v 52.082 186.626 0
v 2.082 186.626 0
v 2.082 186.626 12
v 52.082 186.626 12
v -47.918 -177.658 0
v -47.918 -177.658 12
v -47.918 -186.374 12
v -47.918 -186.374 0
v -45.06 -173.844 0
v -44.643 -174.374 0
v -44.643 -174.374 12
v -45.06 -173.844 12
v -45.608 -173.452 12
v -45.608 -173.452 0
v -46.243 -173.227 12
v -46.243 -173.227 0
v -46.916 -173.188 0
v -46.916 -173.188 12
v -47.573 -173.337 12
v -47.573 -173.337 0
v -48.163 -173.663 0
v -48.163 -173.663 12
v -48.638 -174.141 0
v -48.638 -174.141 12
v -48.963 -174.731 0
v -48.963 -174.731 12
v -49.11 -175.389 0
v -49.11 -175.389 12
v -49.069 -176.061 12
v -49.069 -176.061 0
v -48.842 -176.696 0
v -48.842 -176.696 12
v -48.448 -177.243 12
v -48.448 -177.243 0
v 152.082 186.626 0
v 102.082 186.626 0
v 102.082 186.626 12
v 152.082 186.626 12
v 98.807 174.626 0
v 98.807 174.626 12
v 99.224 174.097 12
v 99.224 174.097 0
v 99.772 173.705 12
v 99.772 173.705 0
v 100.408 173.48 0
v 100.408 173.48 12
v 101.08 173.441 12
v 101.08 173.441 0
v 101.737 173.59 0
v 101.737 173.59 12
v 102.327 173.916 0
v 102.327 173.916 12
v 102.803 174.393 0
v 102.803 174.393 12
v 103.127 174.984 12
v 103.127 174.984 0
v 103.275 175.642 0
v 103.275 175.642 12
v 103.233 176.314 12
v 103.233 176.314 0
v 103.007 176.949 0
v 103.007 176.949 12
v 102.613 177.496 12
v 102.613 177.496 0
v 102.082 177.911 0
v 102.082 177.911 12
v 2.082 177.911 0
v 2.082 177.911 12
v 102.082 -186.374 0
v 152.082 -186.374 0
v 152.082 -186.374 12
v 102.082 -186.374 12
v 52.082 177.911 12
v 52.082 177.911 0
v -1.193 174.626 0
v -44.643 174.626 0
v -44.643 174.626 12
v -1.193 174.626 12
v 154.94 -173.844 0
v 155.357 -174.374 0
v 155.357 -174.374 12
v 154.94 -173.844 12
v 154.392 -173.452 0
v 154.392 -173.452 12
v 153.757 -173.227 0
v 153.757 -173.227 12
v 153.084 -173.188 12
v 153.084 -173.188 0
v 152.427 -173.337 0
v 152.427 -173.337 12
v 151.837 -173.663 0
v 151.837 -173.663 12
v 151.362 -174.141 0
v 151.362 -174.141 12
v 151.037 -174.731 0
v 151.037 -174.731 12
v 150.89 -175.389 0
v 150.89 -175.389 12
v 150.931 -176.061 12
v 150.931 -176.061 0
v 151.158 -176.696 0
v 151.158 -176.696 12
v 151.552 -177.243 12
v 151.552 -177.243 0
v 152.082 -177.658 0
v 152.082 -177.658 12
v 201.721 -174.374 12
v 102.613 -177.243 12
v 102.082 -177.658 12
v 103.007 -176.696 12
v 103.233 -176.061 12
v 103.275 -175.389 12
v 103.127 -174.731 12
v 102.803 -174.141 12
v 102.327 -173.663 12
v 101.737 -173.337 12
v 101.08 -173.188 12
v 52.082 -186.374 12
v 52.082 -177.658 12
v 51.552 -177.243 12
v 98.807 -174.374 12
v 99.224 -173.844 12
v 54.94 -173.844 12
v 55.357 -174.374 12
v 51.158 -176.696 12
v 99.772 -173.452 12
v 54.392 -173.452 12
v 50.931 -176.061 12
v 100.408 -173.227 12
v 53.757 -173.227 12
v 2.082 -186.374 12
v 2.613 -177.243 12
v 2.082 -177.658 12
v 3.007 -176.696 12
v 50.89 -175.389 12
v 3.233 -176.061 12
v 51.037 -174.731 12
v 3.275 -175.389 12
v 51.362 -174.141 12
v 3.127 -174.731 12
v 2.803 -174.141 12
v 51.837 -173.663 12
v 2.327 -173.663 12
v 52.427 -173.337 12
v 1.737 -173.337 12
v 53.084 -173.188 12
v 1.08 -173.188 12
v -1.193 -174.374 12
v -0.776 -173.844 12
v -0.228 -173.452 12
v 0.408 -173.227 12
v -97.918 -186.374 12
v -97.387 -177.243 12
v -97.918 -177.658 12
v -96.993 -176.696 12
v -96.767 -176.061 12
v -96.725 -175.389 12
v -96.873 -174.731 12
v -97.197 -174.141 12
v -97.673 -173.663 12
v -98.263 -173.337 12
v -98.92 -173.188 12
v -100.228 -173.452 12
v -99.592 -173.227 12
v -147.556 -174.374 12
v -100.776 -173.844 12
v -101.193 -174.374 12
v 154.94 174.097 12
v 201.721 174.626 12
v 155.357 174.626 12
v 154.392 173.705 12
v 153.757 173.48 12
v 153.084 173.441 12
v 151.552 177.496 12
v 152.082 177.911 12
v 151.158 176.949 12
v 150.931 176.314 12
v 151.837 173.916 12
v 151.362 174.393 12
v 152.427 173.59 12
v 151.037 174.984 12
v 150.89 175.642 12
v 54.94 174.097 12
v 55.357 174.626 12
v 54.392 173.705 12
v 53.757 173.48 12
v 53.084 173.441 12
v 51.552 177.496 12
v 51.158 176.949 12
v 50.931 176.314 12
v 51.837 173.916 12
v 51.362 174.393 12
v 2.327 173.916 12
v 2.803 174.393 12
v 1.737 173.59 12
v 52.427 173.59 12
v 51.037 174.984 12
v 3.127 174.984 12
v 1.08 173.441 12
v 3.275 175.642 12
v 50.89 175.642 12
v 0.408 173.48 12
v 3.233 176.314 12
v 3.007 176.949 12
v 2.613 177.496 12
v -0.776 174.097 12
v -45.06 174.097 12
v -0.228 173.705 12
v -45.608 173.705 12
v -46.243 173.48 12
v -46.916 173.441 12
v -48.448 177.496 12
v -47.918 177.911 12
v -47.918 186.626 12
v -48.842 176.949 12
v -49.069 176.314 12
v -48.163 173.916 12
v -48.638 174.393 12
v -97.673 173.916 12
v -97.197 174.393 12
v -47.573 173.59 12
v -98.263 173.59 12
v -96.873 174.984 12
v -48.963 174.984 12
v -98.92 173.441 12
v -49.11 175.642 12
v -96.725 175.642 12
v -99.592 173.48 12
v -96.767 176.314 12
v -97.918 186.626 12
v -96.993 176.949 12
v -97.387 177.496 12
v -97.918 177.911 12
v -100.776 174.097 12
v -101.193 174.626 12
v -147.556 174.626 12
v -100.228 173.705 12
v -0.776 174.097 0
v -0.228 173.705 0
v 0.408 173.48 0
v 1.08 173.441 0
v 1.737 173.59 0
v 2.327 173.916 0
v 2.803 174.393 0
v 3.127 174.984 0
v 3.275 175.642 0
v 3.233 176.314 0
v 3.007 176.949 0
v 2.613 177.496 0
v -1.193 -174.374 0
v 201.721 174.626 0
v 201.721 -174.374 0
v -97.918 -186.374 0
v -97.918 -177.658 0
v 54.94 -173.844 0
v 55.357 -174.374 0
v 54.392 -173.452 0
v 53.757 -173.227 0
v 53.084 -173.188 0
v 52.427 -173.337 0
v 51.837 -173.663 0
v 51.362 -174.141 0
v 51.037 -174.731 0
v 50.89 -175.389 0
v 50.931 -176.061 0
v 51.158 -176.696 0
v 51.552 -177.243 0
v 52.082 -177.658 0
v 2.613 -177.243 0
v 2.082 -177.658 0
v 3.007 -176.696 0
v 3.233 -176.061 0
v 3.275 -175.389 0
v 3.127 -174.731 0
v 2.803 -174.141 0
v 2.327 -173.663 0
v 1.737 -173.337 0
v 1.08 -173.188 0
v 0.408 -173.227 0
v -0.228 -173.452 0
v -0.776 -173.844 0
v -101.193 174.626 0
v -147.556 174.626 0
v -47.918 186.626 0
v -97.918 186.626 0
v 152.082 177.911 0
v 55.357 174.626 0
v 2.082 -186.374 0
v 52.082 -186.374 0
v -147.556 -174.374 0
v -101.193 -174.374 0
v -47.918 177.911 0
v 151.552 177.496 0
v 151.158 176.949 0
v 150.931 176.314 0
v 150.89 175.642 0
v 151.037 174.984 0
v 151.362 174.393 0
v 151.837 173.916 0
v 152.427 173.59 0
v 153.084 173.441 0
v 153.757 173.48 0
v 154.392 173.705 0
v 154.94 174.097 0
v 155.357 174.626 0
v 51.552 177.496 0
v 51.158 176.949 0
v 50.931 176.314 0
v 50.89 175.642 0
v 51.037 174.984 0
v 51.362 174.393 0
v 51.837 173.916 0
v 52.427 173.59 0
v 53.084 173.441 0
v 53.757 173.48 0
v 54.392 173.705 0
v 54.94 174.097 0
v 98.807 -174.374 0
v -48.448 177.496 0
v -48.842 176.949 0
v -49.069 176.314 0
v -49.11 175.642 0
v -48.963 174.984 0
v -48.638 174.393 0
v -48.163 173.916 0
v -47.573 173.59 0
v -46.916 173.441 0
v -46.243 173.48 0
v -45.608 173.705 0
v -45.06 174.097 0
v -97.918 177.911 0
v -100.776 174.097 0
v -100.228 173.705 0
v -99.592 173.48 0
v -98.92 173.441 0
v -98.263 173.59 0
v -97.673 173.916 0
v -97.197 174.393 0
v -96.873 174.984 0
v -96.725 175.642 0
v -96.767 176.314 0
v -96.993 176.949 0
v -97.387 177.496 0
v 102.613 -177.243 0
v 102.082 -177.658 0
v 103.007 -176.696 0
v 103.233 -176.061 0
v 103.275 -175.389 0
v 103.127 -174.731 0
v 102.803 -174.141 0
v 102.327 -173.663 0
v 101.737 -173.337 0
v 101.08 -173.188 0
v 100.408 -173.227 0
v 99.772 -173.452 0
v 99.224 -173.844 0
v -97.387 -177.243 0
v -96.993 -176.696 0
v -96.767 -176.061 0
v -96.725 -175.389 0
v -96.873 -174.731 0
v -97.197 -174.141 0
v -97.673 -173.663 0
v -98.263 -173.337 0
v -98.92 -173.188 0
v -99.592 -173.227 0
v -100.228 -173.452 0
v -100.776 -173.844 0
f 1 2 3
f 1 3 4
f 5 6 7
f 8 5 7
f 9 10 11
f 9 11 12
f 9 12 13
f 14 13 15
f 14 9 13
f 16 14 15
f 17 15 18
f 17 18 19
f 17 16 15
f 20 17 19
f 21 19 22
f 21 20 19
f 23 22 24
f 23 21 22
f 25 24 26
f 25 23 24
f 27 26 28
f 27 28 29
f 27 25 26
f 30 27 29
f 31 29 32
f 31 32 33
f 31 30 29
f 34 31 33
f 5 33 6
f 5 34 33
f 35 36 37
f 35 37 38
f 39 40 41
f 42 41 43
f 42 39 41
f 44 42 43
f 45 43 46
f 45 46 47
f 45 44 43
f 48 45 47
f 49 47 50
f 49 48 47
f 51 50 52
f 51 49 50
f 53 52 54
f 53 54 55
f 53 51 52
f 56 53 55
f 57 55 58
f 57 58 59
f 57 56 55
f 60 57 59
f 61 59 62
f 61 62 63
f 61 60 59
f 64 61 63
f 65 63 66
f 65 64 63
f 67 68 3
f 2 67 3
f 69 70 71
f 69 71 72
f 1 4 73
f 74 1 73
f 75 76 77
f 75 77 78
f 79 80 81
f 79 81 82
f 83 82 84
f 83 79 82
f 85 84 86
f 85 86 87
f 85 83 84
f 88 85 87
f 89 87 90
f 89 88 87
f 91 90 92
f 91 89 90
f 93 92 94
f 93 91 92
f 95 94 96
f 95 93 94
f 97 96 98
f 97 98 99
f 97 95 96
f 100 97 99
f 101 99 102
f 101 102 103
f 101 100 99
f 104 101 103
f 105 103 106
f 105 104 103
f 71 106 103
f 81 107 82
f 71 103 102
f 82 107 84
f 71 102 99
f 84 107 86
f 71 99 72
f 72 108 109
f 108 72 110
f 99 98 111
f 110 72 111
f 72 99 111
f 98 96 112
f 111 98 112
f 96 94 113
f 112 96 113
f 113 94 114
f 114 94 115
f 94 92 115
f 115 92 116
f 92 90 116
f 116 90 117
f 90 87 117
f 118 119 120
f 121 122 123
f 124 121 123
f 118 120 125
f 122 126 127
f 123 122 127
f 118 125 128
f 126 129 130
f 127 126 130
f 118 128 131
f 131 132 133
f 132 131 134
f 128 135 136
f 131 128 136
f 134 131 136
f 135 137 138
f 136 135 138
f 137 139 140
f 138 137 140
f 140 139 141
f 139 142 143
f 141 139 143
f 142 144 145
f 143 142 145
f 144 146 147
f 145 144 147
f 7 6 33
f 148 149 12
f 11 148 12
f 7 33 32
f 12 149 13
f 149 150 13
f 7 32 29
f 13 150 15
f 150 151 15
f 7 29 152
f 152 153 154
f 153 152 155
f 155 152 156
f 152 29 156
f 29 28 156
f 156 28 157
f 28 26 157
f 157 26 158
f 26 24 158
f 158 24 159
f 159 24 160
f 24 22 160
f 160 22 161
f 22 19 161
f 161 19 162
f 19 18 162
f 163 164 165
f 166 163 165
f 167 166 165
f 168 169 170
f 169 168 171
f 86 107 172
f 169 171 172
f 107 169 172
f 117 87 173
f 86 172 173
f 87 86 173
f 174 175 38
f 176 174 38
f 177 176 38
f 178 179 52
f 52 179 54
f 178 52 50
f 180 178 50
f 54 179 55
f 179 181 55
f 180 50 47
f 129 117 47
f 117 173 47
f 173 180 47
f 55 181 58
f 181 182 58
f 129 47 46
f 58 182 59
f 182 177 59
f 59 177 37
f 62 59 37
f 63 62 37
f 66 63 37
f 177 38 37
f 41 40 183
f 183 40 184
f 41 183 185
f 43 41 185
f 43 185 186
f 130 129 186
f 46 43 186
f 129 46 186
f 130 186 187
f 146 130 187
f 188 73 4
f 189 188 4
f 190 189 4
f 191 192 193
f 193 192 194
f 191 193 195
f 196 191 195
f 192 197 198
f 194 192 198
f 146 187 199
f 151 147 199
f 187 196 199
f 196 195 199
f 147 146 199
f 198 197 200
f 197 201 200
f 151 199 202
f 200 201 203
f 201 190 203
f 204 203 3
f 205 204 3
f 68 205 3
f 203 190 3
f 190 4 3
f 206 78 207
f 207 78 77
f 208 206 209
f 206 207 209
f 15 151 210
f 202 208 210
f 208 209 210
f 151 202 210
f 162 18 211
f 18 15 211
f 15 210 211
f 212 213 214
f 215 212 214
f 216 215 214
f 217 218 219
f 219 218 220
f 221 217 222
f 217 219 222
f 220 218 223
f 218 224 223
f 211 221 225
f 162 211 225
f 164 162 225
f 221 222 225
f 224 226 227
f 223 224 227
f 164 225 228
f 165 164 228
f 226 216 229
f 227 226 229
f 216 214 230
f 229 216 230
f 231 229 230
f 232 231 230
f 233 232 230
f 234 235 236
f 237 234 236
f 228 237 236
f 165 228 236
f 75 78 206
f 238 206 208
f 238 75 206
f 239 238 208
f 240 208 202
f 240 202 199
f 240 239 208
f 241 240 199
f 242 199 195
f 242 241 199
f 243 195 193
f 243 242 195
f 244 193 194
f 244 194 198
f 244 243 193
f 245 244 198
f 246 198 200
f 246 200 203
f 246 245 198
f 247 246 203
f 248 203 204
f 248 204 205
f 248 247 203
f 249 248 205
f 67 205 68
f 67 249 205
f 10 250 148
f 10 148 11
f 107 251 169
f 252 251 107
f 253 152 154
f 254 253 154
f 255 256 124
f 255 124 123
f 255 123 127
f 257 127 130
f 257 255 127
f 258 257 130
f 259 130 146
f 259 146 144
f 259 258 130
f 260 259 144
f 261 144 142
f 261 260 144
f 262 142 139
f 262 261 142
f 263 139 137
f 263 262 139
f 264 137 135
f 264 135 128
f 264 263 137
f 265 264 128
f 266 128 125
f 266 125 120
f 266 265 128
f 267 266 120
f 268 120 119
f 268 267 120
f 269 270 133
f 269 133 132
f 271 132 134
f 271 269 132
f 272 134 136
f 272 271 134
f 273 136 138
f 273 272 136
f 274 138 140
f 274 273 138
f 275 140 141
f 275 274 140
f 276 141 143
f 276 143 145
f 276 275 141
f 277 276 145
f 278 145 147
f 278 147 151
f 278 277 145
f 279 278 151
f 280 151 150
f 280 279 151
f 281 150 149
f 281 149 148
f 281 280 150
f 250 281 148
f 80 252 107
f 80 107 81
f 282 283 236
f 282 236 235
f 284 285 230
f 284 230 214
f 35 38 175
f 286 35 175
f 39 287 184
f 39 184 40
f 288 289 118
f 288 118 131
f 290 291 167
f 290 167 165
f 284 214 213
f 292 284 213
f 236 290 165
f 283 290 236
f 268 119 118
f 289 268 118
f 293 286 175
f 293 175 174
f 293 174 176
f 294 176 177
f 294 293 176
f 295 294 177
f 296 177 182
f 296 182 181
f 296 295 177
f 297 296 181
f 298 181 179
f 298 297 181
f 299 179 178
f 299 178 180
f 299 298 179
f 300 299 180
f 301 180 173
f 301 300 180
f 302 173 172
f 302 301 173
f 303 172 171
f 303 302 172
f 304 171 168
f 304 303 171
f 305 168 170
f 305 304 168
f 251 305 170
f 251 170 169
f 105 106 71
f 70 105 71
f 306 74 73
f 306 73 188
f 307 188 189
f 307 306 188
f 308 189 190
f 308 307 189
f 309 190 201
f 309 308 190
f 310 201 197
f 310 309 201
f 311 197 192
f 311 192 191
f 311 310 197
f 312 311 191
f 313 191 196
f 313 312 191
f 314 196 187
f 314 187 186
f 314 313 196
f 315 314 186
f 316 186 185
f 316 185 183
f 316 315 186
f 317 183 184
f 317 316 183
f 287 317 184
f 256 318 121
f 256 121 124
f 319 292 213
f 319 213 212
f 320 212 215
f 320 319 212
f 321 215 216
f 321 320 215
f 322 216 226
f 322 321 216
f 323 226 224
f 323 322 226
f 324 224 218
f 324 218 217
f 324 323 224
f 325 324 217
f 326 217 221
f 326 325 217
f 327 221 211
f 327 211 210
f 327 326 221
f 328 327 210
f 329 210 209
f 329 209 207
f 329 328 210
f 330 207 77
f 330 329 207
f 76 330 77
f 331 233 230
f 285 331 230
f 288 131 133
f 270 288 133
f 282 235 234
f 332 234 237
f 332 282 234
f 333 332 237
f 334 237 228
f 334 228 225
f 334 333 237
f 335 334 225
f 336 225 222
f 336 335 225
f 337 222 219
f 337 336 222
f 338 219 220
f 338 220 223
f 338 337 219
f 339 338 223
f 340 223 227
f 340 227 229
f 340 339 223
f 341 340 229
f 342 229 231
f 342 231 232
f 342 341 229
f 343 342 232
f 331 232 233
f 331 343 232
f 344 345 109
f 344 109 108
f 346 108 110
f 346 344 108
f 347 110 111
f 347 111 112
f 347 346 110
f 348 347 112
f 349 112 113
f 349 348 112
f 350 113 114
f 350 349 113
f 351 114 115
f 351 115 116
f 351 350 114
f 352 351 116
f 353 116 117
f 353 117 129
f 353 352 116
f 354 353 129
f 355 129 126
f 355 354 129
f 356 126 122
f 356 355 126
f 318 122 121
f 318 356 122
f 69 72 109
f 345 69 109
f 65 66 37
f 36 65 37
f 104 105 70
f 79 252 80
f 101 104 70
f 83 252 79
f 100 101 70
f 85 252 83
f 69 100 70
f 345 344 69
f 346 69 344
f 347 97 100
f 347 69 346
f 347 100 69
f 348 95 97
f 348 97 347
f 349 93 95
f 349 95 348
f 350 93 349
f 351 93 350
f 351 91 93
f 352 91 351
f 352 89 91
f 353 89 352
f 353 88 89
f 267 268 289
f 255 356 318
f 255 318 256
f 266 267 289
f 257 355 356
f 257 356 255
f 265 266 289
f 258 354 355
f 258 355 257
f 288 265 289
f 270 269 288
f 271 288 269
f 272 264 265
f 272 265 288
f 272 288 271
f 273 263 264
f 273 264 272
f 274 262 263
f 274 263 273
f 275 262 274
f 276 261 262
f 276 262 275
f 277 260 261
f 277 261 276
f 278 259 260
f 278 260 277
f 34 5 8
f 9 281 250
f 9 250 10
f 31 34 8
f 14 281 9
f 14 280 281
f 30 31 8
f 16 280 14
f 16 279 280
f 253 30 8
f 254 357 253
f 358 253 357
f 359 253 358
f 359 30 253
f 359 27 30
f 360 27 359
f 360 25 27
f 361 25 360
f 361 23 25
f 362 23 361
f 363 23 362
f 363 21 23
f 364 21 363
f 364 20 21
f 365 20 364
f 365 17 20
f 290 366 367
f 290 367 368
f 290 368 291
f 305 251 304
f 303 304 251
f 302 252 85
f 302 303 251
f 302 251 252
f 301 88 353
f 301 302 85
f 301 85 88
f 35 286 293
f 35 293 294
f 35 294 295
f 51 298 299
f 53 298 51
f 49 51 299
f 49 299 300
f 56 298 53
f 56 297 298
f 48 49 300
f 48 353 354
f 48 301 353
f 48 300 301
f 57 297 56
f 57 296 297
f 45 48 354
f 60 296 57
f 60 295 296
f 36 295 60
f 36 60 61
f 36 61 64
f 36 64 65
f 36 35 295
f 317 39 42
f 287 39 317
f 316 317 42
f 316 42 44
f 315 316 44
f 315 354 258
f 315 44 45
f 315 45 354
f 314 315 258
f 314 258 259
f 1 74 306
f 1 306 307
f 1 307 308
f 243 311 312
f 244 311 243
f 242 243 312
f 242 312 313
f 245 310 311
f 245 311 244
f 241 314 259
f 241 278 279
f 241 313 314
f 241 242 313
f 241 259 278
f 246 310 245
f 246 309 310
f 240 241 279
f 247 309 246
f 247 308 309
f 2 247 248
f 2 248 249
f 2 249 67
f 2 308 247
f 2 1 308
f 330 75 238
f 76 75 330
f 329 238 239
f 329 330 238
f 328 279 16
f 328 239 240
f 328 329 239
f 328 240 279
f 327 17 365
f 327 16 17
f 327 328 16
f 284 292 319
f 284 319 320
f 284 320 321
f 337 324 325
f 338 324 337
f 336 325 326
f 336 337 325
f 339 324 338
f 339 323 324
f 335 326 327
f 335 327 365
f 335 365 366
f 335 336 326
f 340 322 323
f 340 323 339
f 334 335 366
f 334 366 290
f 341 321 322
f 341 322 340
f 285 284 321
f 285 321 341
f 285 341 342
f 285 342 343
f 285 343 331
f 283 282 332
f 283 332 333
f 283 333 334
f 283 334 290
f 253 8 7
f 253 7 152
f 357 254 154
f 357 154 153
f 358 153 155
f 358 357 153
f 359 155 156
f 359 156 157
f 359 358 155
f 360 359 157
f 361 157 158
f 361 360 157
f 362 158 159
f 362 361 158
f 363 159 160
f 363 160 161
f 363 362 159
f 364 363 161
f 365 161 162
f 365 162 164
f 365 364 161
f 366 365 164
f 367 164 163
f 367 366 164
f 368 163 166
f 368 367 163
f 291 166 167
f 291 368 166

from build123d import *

# Parameters (mm, degrees)
BOSS_EXTRUDE1_DEPTH = 12


with BuildPart() as part:
    # Sketch1 → Boss-Extrude1 (new body)
    with BuildSketch(Plane.XY):
        with BuildLine():
            Line((-147.556413952, 174.626444756), (-101.192621764, 174.626444756))
            ThreePointArc((-101.192621764, 174.626444756), (-97.418155085, 174.138042833), (-97.917719368, 177.911048356))
            Line((-97.917719368, 177.911048356), (-97.917719368, 186.626444756))
            Line((-97.917719368, 186.626444756), (-47.917719368, 186.626444756))
            Line((-47.917719368, 186.626444756), (-47.917719368, 177.911048356))
            ThreePointArc((-47.917719368, 177.911048356), (-48.417283652, 174.138042833), (-44.642816972, 174.626444756))
            Line((-44.642816972, 174.626444756), (-1.192621764, 174.626444756))
            ThreePointArc((-1.192621764, 174.626444756), (2.581844915, 174.138042833), (2.082280632, 177.911048356))
            Line((2.082280632, 177.911048356), (2.082280632, 186.626444756))
            Line((2.082280632, 186.626444756), (52.082280632, 186.626444756))
            Line((52.082280632, 186.626444756), (52.082280632, 177.911048356))
            ThreePointArc((52.082280632, 177.911048356), (51.582716348, 174.138042833), (55.357183028, 174.626444756))
            Line((55.357183028, 174.626444756), (98.807378236, 174.626444756))
            ThreePointArc((98.807378236, 174.626444756), (102.581844915, 174.138042833), (102.082280632, 177.911048356))
            Line((102.082280632, 177.911048356), (102.082280632, 186.626444756))
            Line((102.082280632, 186.626444756), (152.082280632, 186.626444756))
            Line((152.082280632, 186.626444756), (152.082280632, 177.911048356))
            ThreePointArc((152.082280632, 177.911048356), (151.582716348, 174.138042833), (155.357183028, 174.626444756))
            Line((155.357183028, 174.626444756), (201.720975216, 174.626444756))
            Line((201.720975216, 174.626444756), (201.720975216, -174.373555244))
            Line((201.720975216, -174.373555244), (155.357183028, -174.373555244))
            ThreePointArc((155.357183028, -174.373555244), (151.582716348, -173.885153322), (152.082280632, -177.658158845))
            Line((152.082280632, -177.658158845), (152.082280632, -186.373555244))
            Line((152.082280632, -186.373555244), (102.082280632, -186.373555244))
            Line((102.082280632, -186.373555244), (102.082280632, -177.658158845))
            ThreePointArc((102.082280632, -177.658158845), (102.581844915, -173.885153322), (98.807378236, -174.373555244))
            Line((98.807378236, -174.373555244), (55.357183028, -174.373555244))
            ThreePointArc((55.357183028, -174.373555244), (51.582716348, -173.885153322), (52.082280632, -177.658158845))
            Line((52.082280632, -177.658158845), (52.082280632, -186.373555244))
            Line((52.082280632, -186.373555244), (2.082280632, -186.373555244))
            Line((2.082280632, -186.373555244), (2.082280632, -177.658158845))
            ThreePointArc((2.082280632, -177.658158845), (2.581844915, -173.885153322), (-1.192621764, -174.373555244))
            Line((-1.192621764, -174.373555244), (-44.642816972, -174.373555244))
            ThreePointArc((-44.642816972, -174.373555244), (-48.417283652, -173.885153322), (-47.917719368, -177.658158845))
            Line((-47.917719368, -177.658158845), (-47.917719368, -186.373555244))
            Line((-47.917719368, -186.373555244), (-97.917719368, -186.373555244))
            Line((-97.917719368, -186.373555244), (-97.917719368, -177.658158845))
            ThreePointArc((-97.917719368, -177.658158845), (-97.418155085, -173.885153322), (-101.192621764, -174.373555244))
            Line((-101.192621764, -174.373555244), (-147.556413952, -174.373555244))
            Line((-147.556413952, -174.373555244), (-147.556413952, 174.626444756))
        make_face()
    extrude(amount=BOSS_EXTRUDE1_DEPTH)


solid = part.part
